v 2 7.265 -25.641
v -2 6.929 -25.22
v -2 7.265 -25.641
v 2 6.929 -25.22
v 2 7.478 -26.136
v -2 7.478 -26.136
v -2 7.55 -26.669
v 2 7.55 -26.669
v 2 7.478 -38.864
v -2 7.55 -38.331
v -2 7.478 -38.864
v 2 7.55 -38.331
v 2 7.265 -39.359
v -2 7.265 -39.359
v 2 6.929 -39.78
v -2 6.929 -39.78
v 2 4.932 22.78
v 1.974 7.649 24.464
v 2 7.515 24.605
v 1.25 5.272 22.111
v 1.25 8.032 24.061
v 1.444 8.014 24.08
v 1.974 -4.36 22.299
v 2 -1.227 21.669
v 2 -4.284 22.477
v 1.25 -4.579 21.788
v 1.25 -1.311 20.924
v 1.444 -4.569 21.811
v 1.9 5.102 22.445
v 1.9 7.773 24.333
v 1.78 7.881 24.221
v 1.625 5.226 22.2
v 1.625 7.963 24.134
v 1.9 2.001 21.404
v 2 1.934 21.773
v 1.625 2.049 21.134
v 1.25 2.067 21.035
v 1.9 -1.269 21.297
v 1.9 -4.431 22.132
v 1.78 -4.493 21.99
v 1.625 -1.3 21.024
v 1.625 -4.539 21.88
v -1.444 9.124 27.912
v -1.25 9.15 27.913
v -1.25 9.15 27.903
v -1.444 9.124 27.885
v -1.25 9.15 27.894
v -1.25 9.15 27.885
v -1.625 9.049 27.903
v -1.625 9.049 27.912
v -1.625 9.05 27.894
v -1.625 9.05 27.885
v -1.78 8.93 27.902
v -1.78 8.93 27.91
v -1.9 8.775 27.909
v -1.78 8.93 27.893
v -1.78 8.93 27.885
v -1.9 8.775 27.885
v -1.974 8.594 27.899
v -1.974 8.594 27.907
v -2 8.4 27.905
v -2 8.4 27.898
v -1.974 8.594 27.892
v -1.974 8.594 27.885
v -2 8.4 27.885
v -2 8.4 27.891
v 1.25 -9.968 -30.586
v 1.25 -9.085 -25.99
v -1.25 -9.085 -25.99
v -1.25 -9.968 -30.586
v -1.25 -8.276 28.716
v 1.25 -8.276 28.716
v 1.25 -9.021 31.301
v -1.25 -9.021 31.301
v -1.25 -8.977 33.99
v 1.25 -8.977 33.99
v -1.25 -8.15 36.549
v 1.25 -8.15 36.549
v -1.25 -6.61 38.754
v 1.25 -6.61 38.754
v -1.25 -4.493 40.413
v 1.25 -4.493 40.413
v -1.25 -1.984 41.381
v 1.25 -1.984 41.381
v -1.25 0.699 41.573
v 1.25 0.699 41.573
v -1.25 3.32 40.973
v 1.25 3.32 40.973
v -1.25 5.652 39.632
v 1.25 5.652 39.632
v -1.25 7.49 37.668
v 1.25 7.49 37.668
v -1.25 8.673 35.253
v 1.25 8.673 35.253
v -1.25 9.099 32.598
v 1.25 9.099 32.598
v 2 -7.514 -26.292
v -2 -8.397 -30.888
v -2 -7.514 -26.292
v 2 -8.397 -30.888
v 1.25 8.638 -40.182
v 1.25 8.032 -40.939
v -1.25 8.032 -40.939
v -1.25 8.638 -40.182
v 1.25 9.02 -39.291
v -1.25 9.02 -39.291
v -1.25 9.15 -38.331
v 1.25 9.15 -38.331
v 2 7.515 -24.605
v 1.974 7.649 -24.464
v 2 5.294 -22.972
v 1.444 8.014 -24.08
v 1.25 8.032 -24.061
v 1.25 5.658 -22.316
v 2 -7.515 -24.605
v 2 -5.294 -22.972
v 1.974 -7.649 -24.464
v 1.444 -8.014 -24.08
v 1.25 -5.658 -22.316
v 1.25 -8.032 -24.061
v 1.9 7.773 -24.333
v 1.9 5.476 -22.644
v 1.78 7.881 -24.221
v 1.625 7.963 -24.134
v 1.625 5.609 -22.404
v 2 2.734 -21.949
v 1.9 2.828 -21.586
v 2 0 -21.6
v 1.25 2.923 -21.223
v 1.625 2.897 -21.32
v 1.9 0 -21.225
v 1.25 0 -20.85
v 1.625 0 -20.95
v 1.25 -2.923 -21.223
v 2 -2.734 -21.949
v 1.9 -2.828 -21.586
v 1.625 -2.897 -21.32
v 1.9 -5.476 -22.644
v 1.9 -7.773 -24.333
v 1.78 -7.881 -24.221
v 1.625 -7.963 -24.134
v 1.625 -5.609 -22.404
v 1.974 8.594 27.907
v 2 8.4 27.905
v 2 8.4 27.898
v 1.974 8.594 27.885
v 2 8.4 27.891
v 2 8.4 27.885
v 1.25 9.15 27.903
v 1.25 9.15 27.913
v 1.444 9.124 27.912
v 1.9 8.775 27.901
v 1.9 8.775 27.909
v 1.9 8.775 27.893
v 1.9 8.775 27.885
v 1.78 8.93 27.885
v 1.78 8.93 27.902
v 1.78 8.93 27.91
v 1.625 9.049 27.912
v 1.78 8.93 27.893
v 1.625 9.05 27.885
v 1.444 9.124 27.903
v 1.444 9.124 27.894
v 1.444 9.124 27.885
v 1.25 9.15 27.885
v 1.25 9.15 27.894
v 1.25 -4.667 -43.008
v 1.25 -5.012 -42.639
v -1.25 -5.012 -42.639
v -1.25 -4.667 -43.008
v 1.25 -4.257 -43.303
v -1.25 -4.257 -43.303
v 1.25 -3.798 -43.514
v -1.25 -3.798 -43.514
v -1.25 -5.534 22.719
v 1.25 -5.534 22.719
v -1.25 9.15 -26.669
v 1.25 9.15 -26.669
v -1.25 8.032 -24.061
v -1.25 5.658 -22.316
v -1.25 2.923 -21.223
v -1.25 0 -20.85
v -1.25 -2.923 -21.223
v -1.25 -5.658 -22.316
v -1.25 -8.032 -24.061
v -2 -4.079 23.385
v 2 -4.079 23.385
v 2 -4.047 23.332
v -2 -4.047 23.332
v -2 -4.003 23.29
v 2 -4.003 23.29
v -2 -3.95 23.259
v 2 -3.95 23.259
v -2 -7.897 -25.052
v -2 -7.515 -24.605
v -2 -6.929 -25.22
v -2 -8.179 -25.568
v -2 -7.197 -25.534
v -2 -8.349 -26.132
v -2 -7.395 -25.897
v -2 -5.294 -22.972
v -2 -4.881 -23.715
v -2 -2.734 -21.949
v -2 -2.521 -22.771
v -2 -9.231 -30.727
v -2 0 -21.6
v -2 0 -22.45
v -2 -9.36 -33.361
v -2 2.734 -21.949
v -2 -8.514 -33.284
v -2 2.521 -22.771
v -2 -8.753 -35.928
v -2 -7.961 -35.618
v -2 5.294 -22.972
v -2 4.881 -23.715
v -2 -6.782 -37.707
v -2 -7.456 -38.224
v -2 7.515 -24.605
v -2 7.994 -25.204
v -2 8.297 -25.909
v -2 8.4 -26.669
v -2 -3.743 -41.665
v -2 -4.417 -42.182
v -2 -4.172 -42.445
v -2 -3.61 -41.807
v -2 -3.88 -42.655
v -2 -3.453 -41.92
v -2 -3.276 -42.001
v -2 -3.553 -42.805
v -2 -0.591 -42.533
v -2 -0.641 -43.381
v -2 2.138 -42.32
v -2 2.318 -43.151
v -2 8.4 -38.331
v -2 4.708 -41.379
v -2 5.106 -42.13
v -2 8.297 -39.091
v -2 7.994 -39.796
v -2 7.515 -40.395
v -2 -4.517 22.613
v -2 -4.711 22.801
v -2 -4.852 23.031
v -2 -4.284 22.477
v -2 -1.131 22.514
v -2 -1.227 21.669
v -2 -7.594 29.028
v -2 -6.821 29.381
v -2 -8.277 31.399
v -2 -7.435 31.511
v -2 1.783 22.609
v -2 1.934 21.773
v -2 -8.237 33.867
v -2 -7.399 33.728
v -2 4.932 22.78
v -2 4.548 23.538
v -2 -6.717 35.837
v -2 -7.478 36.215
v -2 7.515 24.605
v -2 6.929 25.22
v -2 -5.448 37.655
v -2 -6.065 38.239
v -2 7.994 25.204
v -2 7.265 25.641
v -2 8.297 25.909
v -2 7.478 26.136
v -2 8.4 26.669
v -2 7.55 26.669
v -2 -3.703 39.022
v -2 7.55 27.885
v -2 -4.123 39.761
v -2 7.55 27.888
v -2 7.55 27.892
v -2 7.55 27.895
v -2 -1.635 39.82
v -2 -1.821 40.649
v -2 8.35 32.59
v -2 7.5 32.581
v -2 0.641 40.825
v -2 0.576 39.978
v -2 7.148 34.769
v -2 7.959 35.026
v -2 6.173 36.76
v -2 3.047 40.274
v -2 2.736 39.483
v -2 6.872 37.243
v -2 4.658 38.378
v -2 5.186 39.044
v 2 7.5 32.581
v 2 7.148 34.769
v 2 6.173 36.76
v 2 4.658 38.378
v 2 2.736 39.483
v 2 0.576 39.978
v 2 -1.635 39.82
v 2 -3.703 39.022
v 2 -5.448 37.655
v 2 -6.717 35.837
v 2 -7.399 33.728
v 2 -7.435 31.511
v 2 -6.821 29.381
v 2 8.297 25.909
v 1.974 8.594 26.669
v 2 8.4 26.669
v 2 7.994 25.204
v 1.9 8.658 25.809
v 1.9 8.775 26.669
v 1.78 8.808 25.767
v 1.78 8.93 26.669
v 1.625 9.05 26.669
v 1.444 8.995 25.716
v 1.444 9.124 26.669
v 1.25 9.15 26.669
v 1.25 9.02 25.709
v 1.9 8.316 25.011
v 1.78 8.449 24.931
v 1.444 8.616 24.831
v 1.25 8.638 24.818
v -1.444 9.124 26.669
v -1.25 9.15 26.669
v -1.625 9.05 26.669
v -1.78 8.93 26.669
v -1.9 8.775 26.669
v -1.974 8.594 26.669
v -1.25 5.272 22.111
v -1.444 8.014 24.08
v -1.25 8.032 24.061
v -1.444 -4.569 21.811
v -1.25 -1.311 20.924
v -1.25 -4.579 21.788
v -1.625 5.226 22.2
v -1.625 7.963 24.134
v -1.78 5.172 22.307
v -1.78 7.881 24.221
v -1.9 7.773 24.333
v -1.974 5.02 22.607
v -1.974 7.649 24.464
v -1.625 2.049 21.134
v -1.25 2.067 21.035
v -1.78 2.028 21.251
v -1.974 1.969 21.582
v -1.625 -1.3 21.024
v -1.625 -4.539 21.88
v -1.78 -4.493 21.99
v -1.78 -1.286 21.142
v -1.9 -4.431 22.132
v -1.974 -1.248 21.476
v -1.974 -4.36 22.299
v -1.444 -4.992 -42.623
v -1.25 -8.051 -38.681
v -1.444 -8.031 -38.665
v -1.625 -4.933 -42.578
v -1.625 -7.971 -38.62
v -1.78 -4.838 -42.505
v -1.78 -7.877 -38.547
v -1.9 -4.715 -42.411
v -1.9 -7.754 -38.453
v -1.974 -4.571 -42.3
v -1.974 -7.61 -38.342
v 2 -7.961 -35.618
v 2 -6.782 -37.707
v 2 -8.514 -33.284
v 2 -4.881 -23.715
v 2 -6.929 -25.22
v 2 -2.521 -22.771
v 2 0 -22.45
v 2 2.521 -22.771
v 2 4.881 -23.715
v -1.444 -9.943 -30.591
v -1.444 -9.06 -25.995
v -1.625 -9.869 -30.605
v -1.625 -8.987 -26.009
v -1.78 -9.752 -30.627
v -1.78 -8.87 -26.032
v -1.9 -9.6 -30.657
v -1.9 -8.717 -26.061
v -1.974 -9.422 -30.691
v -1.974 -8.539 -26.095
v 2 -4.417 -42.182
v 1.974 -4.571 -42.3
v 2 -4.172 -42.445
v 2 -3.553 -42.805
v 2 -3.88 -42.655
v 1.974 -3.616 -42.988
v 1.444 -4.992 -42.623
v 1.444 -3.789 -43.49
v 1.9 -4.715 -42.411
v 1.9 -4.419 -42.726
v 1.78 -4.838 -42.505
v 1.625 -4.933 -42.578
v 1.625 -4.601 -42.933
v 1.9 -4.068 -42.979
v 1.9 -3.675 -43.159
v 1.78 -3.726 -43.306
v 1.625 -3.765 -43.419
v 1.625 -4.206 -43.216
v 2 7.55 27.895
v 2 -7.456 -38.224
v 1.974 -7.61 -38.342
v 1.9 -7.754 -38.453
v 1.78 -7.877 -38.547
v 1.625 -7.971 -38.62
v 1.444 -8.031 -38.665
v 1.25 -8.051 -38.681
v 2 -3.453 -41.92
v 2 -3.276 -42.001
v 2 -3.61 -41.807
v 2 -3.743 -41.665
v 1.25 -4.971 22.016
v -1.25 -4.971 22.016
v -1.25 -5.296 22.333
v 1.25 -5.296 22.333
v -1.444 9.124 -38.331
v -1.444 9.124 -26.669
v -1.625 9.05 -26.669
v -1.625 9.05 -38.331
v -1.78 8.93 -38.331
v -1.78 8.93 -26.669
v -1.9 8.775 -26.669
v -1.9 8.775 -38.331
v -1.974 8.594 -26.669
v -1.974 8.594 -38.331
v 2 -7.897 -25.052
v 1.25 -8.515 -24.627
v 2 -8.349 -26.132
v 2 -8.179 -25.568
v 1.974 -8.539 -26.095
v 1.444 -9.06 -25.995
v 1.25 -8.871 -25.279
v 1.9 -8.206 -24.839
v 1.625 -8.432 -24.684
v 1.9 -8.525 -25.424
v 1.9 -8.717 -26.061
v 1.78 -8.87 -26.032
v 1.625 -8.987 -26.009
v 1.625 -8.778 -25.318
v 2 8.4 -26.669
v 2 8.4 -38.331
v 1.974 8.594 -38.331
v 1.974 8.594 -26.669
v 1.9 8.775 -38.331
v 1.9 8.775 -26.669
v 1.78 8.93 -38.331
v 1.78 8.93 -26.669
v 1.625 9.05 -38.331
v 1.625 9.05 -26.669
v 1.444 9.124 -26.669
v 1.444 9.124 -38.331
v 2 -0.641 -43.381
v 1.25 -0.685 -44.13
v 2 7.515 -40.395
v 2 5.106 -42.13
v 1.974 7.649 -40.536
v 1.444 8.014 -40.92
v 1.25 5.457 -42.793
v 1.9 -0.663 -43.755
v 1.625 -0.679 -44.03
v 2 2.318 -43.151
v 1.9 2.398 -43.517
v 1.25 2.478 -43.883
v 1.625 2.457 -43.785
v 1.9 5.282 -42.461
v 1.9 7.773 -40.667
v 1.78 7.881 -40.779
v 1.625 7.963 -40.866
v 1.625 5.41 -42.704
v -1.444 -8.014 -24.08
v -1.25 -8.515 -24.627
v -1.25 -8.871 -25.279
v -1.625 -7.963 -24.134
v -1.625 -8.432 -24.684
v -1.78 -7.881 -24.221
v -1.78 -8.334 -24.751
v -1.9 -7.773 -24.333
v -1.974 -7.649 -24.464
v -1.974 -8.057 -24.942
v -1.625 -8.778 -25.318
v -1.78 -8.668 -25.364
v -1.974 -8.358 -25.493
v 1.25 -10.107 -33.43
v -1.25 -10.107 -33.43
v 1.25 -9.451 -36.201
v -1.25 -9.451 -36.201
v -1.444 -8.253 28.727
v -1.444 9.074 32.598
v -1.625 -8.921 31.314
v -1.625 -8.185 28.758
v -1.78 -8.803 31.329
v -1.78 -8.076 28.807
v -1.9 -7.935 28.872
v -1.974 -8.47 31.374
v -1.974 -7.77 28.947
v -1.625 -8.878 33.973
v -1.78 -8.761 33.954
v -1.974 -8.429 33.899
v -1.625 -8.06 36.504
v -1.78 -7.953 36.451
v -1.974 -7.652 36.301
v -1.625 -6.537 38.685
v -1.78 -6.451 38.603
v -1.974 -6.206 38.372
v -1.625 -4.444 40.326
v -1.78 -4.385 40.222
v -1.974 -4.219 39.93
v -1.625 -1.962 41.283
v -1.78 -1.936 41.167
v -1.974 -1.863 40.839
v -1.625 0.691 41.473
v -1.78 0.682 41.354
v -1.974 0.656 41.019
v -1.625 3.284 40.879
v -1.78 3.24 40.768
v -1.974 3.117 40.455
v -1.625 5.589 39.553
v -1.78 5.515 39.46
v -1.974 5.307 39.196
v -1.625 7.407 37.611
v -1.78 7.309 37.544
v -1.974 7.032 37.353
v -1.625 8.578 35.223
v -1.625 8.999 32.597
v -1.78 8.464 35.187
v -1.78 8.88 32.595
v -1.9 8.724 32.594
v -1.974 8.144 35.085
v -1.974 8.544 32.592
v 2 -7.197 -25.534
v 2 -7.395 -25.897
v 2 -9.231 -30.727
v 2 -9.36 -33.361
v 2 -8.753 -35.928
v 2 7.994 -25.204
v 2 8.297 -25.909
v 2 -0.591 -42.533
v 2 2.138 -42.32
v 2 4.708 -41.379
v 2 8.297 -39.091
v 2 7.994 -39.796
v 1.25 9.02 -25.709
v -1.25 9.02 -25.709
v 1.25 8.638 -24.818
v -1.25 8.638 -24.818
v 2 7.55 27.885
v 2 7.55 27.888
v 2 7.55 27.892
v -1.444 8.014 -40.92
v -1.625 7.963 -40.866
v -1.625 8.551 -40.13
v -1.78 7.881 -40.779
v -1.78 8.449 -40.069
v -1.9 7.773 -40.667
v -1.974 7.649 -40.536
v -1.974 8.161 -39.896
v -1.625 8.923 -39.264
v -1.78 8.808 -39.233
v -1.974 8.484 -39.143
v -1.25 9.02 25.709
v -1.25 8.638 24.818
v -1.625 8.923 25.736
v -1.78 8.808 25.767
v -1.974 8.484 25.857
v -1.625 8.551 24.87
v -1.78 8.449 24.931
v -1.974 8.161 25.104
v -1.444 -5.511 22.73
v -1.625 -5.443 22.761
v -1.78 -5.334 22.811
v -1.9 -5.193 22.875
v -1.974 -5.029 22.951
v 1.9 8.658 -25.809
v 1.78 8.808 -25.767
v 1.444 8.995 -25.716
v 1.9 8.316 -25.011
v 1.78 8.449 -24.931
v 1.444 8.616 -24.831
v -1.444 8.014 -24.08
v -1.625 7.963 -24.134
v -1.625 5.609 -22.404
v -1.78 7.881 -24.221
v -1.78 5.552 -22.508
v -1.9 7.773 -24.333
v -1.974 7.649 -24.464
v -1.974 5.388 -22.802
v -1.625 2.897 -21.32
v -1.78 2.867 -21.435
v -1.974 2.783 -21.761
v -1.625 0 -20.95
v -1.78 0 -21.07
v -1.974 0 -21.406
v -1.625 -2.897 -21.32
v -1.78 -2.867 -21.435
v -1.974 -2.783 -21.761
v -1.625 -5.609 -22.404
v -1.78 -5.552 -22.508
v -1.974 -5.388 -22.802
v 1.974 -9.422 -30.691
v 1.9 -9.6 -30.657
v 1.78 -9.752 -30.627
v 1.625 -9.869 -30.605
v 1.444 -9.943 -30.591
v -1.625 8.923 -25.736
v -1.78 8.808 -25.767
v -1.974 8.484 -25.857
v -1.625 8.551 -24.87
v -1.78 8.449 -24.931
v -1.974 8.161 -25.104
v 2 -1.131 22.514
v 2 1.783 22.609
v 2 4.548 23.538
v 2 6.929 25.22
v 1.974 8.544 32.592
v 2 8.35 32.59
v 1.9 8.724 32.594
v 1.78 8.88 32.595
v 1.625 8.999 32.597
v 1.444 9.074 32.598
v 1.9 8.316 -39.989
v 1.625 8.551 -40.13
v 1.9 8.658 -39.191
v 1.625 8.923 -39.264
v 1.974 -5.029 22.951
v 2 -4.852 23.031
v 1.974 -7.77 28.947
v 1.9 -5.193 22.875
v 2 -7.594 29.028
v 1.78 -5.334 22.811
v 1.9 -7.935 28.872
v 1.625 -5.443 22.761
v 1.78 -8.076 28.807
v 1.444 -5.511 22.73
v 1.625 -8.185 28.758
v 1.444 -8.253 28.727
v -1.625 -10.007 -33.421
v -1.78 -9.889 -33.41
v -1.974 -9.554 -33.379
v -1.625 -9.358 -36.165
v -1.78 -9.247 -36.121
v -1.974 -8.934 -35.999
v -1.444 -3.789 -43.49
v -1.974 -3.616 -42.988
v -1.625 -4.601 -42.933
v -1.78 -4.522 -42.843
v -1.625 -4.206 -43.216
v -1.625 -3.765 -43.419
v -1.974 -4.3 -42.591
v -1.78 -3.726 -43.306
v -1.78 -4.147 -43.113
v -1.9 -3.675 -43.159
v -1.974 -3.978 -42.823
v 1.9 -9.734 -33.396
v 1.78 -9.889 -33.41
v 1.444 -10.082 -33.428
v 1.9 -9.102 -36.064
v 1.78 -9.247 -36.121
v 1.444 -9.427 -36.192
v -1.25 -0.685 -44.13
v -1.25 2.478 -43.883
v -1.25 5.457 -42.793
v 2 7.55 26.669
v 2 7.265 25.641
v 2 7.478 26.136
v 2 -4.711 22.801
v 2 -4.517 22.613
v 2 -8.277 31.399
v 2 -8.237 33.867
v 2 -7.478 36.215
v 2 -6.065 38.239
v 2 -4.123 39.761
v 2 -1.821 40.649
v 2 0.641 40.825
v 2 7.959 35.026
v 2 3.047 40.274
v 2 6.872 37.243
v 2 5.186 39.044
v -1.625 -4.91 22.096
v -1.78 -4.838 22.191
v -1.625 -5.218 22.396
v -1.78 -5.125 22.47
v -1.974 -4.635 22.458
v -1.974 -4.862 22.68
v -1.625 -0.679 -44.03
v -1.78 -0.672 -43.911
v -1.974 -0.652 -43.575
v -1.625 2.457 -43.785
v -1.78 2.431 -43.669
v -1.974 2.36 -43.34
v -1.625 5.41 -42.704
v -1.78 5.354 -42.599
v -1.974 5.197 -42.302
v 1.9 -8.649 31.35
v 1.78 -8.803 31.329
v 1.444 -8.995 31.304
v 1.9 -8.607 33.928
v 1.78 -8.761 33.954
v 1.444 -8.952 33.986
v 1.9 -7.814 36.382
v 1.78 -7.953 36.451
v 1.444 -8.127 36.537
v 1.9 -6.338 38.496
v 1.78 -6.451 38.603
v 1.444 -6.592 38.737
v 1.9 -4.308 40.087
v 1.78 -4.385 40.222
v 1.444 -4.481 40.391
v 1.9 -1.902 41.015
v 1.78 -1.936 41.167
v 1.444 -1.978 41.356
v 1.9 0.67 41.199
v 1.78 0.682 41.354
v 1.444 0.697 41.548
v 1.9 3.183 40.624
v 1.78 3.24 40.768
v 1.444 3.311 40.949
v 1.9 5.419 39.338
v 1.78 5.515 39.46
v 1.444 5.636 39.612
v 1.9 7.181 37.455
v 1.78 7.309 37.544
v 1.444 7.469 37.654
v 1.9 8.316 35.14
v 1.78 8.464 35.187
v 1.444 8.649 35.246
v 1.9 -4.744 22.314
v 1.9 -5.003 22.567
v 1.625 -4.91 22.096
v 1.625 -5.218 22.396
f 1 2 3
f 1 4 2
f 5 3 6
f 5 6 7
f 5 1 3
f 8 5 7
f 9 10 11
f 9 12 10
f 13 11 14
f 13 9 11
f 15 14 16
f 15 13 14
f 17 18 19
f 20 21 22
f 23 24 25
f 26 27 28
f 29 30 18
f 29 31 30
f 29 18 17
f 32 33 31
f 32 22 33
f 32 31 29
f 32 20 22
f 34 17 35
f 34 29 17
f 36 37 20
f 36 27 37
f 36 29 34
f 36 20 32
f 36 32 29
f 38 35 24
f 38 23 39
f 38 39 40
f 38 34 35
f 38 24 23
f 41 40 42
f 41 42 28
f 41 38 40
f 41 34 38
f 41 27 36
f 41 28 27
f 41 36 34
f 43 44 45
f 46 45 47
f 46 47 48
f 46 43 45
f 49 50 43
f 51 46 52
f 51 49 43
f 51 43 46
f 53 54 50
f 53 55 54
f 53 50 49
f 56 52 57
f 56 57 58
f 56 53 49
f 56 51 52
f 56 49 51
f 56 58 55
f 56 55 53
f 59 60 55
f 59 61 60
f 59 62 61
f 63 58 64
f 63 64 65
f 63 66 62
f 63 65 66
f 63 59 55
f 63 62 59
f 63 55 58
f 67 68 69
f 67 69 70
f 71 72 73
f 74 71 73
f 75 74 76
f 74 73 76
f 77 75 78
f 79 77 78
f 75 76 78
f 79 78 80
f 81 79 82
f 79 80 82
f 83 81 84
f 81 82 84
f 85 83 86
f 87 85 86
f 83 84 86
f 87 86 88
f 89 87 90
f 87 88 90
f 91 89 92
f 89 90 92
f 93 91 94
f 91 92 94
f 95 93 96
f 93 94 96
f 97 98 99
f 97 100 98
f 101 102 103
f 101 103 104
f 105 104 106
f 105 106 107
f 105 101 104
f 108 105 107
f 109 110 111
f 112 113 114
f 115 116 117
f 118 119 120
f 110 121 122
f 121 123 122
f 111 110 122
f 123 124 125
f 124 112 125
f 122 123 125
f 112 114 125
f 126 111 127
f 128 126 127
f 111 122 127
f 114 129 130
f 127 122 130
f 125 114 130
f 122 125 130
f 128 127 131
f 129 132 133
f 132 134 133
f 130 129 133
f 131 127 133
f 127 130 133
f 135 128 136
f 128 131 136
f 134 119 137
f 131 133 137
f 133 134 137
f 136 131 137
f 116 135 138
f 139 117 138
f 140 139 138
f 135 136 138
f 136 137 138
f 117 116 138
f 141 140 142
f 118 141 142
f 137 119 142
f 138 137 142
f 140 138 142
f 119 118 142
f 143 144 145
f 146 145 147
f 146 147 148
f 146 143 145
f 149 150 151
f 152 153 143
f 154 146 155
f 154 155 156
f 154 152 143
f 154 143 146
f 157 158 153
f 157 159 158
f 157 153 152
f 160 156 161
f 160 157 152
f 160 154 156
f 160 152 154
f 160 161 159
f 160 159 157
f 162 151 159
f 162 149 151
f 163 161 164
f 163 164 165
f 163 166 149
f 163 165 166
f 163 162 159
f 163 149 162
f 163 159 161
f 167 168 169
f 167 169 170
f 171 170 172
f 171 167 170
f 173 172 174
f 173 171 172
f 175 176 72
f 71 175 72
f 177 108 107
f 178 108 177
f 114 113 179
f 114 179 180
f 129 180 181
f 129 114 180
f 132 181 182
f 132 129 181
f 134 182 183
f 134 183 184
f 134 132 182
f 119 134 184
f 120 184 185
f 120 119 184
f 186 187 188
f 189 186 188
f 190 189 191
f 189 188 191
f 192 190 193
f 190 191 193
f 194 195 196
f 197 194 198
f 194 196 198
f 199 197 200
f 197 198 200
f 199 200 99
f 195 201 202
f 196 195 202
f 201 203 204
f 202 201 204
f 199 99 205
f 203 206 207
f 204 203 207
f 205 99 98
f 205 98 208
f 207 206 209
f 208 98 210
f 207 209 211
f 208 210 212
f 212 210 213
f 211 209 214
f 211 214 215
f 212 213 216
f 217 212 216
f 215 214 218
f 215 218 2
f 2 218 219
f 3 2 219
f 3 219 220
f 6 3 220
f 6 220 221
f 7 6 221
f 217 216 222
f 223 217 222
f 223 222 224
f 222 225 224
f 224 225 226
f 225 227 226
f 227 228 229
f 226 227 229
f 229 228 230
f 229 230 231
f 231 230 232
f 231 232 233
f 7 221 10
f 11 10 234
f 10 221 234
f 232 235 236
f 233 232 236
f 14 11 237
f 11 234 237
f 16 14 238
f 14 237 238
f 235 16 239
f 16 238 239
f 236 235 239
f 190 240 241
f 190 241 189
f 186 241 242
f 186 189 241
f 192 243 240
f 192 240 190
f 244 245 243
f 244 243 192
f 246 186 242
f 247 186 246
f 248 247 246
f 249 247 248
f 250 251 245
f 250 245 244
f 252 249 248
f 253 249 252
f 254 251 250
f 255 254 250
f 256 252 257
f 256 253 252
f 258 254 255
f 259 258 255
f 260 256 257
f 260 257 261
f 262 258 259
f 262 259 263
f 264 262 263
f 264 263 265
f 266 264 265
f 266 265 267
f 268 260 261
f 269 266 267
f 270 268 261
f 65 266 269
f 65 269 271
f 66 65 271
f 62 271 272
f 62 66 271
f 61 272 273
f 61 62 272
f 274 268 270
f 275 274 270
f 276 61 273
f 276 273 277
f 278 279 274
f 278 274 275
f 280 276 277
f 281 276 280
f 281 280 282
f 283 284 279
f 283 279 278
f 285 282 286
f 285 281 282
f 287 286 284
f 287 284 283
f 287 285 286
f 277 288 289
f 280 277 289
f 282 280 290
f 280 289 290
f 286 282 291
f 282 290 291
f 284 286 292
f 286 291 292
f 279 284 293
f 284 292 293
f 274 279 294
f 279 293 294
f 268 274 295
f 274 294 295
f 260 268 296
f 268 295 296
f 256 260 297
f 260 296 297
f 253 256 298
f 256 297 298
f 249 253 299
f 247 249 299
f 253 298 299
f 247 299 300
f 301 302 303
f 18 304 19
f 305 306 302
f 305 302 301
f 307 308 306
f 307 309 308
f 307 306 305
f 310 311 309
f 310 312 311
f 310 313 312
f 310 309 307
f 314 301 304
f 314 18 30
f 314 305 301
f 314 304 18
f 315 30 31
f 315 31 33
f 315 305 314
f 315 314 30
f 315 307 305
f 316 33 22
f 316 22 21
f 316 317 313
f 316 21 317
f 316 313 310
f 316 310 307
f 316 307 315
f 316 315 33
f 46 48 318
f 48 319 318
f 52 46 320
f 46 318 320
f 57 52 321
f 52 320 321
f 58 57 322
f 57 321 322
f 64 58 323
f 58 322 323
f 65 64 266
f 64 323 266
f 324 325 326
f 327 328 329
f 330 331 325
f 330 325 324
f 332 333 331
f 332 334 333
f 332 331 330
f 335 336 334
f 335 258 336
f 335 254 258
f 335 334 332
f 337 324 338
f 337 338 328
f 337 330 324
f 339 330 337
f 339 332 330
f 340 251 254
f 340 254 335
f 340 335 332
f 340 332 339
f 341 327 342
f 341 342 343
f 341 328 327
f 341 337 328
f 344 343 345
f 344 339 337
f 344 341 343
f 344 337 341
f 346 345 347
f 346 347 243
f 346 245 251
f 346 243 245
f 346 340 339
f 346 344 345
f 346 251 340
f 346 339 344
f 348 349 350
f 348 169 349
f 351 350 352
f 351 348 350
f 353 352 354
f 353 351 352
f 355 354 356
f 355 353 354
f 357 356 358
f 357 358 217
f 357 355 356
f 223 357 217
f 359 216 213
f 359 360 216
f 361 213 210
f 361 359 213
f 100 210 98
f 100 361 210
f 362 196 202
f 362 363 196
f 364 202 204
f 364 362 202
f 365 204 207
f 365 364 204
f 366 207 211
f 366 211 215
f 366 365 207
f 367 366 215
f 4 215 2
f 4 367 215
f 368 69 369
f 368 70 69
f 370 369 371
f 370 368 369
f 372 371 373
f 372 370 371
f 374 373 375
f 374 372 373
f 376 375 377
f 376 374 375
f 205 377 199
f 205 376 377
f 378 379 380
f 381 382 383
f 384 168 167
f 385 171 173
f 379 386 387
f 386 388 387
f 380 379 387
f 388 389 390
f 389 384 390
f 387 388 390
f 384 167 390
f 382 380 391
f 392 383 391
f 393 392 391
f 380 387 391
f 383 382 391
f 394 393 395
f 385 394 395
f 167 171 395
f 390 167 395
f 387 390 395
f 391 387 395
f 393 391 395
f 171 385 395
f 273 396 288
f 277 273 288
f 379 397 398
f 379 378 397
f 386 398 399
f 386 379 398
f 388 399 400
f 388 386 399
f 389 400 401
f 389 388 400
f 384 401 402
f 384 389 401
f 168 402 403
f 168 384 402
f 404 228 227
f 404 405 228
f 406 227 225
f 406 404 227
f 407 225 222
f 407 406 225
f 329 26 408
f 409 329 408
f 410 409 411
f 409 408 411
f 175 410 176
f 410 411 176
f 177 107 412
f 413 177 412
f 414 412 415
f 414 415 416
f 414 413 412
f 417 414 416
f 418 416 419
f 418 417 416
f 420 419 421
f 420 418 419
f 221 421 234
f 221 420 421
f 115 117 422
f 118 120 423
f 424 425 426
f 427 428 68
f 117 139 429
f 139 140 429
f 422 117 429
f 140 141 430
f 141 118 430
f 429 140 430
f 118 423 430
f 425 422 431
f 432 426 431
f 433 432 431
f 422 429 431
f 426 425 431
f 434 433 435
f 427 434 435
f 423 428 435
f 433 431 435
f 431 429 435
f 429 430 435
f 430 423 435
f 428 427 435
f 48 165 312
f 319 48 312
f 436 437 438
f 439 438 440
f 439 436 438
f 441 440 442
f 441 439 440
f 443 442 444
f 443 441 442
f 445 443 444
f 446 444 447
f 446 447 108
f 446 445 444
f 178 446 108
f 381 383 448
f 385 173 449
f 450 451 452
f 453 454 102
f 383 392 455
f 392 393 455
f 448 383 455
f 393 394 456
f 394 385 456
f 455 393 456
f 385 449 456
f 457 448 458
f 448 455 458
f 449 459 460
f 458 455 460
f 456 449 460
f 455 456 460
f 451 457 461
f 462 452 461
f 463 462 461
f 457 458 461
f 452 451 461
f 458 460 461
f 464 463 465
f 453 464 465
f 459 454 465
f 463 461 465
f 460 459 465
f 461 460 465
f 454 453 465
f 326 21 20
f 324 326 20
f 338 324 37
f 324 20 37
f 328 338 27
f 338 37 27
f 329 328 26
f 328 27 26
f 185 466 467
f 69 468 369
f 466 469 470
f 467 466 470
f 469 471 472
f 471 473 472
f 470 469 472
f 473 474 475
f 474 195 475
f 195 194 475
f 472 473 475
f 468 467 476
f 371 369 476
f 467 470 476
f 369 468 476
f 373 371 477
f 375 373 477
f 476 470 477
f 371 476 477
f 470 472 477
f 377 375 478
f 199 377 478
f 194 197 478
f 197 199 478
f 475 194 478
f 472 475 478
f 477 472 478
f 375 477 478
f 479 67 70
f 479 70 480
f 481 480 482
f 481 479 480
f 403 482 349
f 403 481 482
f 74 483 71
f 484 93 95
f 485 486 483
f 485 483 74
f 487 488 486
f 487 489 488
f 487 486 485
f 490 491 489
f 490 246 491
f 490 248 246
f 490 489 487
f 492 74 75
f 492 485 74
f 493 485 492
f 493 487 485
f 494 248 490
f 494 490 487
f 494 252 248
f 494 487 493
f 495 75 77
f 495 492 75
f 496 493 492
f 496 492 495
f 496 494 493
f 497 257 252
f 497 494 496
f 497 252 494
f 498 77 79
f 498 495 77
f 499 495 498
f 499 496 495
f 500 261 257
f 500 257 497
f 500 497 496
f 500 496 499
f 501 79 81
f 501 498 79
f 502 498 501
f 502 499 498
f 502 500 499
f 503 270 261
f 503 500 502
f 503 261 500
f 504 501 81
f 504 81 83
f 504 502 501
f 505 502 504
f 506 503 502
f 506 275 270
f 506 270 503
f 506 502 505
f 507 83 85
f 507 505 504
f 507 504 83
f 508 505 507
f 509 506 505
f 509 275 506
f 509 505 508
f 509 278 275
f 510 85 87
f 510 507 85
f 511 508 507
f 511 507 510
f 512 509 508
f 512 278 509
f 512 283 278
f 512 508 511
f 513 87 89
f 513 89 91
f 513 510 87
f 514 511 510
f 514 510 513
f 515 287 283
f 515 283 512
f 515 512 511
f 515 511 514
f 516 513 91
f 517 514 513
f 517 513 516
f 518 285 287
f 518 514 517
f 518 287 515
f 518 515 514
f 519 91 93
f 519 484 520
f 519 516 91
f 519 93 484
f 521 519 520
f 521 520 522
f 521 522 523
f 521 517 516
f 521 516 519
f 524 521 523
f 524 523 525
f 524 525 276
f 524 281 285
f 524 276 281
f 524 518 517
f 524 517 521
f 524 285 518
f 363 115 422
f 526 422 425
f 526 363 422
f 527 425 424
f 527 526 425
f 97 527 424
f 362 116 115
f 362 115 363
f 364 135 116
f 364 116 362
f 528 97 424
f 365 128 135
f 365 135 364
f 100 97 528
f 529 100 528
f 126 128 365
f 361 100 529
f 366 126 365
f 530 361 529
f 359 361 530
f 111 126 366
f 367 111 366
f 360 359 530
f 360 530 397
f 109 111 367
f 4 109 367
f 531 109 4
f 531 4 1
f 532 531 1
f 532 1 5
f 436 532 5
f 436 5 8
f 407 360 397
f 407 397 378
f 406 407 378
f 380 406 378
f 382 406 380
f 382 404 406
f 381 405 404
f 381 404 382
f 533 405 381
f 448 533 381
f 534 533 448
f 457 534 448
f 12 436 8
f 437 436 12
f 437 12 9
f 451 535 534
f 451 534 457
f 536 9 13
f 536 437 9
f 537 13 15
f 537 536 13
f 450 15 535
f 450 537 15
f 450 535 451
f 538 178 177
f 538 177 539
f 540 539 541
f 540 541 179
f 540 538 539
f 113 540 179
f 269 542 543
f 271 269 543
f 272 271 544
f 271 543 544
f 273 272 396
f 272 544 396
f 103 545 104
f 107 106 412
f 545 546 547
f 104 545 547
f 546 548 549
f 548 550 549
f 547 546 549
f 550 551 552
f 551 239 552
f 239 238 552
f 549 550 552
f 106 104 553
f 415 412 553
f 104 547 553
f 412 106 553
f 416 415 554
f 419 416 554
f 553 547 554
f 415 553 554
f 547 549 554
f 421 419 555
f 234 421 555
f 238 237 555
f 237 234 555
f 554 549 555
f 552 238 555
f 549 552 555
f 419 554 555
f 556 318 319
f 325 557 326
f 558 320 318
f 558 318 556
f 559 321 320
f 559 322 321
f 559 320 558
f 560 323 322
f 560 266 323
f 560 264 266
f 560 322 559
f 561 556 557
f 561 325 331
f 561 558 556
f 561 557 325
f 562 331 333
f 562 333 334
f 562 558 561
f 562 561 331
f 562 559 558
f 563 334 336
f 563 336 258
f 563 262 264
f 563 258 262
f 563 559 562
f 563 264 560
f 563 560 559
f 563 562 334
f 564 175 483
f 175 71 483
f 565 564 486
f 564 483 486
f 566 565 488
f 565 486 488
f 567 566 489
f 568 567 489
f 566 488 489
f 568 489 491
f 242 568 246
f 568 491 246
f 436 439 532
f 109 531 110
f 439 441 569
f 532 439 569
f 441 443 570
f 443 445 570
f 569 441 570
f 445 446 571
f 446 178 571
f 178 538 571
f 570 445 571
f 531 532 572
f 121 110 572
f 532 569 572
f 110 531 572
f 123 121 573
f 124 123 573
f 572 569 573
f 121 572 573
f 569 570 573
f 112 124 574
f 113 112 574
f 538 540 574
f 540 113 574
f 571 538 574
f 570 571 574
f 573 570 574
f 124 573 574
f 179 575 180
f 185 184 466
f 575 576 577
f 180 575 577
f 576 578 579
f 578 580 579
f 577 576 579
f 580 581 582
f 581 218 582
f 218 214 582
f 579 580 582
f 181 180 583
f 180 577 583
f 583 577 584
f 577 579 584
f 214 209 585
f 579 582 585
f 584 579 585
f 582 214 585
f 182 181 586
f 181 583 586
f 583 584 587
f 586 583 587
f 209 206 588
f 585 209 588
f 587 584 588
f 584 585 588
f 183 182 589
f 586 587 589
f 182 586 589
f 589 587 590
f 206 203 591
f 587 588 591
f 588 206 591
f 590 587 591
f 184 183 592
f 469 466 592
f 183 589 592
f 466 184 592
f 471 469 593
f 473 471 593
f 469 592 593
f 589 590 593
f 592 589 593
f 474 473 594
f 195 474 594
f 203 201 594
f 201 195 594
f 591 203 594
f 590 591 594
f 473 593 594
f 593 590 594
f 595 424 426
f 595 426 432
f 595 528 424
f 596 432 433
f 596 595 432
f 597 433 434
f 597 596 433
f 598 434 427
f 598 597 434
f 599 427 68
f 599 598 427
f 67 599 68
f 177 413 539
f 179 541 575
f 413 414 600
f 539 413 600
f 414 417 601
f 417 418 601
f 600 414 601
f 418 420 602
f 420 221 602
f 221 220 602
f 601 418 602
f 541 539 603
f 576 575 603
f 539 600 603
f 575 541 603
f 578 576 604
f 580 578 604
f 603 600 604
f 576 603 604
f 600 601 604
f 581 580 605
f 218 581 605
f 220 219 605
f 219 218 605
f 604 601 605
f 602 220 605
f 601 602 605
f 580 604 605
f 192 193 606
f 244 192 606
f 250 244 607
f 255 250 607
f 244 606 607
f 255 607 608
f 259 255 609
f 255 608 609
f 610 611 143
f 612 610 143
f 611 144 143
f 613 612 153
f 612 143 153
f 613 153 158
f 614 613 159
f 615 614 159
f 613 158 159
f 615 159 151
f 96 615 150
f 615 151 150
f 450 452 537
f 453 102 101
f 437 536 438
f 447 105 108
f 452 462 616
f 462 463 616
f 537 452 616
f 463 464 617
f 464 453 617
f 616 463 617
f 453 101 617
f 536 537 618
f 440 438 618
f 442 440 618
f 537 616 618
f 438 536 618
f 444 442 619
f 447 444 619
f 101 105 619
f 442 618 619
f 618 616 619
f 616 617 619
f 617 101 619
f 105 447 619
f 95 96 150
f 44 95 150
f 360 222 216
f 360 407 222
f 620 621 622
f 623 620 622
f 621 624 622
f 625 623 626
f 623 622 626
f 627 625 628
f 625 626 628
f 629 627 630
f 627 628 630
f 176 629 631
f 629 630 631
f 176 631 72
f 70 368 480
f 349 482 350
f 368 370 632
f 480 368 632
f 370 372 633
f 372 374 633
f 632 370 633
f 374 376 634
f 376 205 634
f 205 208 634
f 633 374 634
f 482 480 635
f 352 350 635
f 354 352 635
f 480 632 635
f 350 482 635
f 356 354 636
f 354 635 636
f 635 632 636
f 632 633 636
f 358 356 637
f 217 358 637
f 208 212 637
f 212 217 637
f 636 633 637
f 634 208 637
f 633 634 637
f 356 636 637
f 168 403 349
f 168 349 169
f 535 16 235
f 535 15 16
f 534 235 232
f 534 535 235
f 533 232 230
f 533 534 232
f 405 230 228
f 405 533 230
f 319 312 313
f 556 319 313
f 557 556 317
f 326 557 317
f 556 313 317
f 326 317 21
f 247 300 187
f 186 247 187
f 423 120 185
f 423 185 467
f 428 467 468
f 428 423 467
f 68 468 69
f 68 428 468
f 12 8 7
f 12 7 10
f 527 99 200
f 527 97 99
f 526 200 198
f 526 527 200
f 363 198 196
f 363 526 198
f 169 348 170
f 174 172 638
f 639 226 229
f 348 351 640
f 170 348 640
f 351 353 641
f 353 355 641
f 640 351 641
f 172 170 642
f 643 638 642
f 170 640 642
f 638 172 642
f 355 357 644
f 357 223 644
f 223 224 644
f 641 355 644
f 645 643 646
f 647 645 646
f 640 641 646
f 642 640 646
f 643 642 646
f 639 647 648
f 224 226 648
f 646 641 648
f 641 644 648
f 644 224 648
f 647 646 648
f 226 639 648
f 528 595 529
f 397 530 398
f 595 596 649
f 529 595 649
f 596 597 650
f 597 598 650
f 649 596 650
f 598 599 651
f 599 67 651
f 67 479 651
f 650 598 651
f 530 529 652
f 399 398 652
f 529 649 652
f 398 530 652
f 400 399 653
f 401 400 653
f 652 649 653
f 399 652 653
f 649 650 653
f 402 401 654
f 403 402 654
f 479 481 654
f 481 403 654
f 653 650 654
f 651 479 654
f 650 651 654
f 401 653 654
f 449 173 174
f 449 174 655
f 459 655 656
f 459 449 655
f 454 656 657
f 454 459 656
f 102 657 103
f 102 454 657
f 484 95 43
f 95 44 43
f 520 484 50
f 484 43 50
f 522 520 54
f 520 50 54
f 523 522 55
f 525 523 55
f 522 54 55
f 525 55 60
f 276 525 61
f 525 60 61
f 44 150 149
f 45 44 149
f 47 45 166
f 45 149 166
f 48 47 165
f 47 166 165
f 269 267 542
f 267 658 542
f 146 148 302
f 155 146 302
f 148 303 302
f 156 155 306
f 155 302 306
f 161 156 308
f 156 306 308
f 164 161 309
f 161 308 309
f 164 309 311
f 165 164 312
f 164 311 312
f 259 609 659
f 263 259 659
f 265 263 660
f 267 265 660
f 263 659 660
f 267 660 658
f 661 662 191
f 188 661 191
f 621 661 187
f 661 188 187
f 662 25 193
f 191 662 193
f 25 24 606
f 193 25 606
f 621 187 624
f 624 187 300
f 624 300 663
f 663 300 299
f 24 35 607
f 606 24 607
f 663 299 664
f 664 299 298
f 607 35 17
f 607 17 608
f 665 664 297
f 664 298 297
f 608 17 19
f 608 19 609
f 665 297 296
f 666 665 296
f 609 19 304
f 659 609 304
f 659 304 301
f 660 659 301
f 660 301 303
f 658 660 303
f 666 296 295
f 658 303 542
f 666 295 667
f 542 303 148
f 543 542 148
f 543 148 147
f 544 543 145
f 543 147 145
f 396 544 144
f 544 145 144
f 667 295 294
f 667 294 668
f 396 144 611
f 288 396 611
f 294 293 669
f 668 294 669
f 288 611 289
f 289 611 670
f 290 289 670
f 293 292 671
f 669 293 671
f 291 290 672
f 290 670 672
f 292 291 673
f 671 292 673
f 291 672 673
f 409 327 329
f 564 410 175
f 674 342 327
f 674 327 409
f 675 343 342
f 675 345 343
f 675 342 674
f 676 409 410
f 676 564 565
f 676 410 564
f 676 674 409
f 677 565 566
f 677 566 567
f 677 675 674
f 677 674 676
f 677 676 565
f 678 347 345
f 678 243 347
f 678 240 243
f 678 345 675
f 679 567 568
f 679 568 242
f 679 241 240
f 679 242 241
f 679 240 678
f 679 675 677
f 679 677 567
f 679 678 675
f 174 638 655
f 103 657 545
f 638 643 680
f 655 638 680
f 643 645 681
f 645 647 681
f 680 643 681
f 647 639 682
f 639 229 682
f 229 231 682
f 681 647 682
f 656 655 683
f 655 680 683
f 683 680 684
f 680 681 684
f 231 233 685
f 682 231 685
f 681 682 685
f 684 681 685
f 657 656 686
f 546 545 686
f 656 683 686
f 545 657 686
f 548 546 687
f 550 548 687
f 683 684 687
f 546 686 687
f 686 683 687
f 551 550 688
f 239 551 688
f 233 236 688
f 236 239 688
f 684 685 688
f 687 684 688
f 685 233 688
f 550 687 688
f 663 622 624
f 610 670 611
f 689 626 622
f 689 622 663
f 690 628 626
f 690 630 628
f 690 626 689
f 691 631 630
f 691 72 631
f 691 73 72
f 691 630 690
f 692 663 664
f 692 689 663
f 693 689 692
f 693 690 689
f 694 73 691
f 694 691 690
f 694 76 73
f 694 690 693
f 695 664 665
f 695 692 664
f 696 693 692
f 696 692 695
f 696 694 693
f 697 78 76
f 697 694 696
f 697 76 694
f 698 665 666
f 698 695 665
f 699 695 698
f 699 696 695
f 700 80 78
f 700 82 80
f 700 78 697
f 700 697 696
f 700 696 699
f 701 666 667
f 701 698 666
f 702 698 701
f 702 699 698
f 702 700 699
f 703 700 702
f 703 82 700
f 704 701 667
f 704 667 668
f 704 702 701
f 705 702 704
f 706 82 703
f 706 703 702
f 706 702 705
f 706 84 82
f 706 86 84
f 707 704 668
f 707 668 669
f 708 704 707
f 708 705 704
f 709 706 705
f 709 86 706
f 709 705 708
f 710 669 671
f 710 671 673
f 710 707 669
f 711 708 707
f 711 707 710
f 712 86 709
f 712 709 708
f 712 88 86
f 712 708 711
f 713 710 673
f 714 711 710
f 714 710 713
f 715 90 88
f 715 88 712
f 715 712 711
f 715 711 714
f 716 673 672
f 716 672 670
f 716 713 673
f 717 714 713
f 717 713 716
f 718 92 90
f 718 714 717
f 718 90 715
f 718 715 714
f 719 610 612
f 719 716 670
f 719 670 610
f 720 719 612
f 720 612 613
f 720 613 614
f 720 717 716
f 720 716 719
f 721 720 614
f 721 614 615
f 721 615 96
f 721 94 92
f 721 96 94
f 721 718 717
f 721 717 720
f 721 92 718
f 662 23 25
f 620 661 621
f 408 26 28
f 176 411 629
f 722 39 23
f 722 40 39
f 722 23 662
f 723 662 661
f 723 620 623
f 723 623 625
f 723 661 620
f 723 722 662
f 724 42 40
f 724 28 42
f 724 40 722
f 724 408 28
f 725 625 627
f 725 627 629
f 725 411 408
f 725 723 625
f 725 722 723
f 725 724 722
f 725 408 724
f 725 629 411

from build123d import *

# Parameters (mm, degrees)
BOSS_EXTRUDE1_DEPTH   = 2
BOSS_EXTRUDE1_2_DEPTH = 2
FILLET1_R             = 0.75
FILLET2_R             = 0.75


with BuildPart() as part:
    # Sketch2 → Boss-Extrude1 (new, symmetric)
    with BuildSketch(Plane(origin=(0, 0, 0), x_dir=(0, 0, -1), z_dir=(1, 0, 0))):
        with BuildLine():
            Line((38.680908936, -8.051016378), (42.638986873, -5.012329319))
            ThreePointArc((42.638986873, -5.012329319), (43.165658722, -4.469234537), (43.513690973, -3.797513812))
            ThreePointArc((43.513690973, -3.797513812), (43.883409513, 2.478000778), (40.938582556, 8.031987578))
            ThreePointArc((40.938582556, 8.031987578), (39.749550626, 8.858712384), (38.330951895, 9.15))
            Line((38.330951895, 9.15), (26.669048105, 9.15))
            ThreePointArc((26.669048105, 9.15), (25.250449374, 8.858712384), (24.061417444, 8.031987578))
            ThreePointArc((24.061417444, 8.031987578), (20.85, 0), (24.061417444, -8.031987578))
            ThreePointArc((24.061417444, -8.031987578), (24.943446907, -8.709477885), (25.990176628, -9.085411365))
            Line((25.990176628, -9.085411365), (30.585959585, -9.967895931))
            ThreePointArc((30.585959585, -9.967895931), (34.83883487, -9.876859392), (38.680908936, -8.051016378))
        make_face()
        with BuildLine():
            Line((26.669048105, 7.55), (38.330951895, 7.55))
            ThreePointArc((38.330951895, 7.55), (39.119062301, 7.388173547), (39.779635595, 6.928881988))
            ThreePointArc((39.779635595, 6.928881988), (42.320022799, 2.137674491), (42.001081054, -3.275966851))
            ThreePointArc((42.001081054, -3.275966851), (41.867222496, -3.534320976), (41.6646564, -3.743203584))
            Line((41.6646564, -3.743203584), (37.706578463, -6.781890644))
            ThreePointArc((37.706578463, -6.781890644), (34.470151541, -8.31991604), (30.887680242, -8.396601991))
            Line((30.887680242, -8.396601991), (26.291897285, -7.514117425))
            ThreePointArc((26.291897285, -7.514117425), (25.710380773, -7.305265492), (25.220364405, -6.928881988))
            ThreePointArc((25.220364405, -6.928881988), (22.45, 0), (25.220364405, 6.928881988))
            ThreePointArc((25.220364405, 6.928881988), (25.880937699, 7.388173547), (26.669048105, 7.55))
        make_face(mode=Mode.SUBTRACT)
    extrude(amount=BOSS_EXTRUDE1_DEPTH, both=True)

    # Fillet1
    fillet1_edges = [part.edges().sort_by_distance(p)[0] for p in [
        (2, -4.469234537, -43.165658722),
        (-2, 0, -20.85),
        (-2, 8.858712384, -25.250449374),
        (-2, 9.15, -32.5),
        (-2, 8.858712384, -39.749550626),
        (-2, 2.478000778, -43.883409513),
        (-2, -4.469234537, -43.165658722),
        (-2, -6.531672849, -40.659947904),
        (-2, -9.876859392, -34.83883487),
        (2, 2.478000778, -43.883409513),
        (2, 8.858712384, -39.749550626),
        (2, 9.15, -32.5),
        (2, 8.858712384, -25.250449374),
        (2, 0, -20.85),
        (2, -8.709477885, -24.943446907),
        (2, -9.526653648, -28.288068107),
        (2, -9.876859392, -34.83883487),
        (2, -6.531672849, -40.659947904),
        (-2, -9.526653648, -28.288068107),
        (-2, -8.709477885, -24.943446907),
    ]]
    fillet(fillet1_edges, radius=FILLET1_R)


with BuildPart() as body_2:
    # Sketch2 → Boss-Extrude1 2 (new, symmetric)
    with BuildSketch(Plane(origin=(0, 0, 0), x_dir=(0, 0, -1), z_dir=(1, 0, 0))):
        with BuildLine():
            Line((-32.597839378, 9.099474021), (-27.91268728, 9.14984972))
            ThreePointArc((-27.91268728, 9.14984972), (-27.898710428, 9.14996243), (-27.884733172, 9.15))
            Line((-27.884733172, 9.15), (-26.669048105, 9.15))
            ThreePointArc((-26.669048105, 9.15), (-25.250449374, 8.858712384), (-24.061417444, 8.031987578))
            ThreePointArc((-24.061417444, 8.031987578), (-21.034885432, 2.067280325), (-21.78755022, -4.578855721))
            ThreePointArc((-21.78755022, -4.578855721), (-22.164331782, -5.143496424), (-22.7194136, -5.534223493))
            Line((-22.7194136, -5.534223493), (-28.716095774, -8.275993524))
            ThreePointArc((-28.716095774, -8.275993524), (-41.381074632, -1.984064864), (-32.597839378, 9.099474021))
        make_face()
        with BuildLine():
            Line((-26.669048105, 7.55), (-27.884733172, 7.55))
            ThreePointArc((-27.884733172, 7.55), (-27.89010904, 7.54998555), (-27.895484752, 7.5499422))
            Line((-27.895484752, 7.5499422), (-32.58063685, 7.499566501))
            ThreePointArc((-32.58063685, 7.499566501), (-39.819567004, -1.635218294), (-29.381397616, -6.820873784))
            Line((-29.381397616, -6.820873784), (-23.384715442, -4.079103753))
            ThreePointArc((-23.384715442, -4.079103753), (-23.309704386, -4.026302798), (-23.258787958, -3.95))
            ThreePointArc((-23.258787958, -3.95), (-22.609493441, 1.783361997), (-25.220364405, 6.928881988))
            ThreePointArc((-25.220364405, 6.928881988), (-25.880937699, 7.388173547), (-26.669048105, 7.55))
        make_face(mode=Mode.SUBTRACT)
    extrude(amount=BOSS_EXTRUDE1_2_DEPTH, both=True)

    # Fillet2
    fillet2_edges = [body_2.edges().sort_by_distance(p)[0] for p in [
        (2, -5.143496424, 22.164331782),
        (-2, -6.905108509, 25.717754687),
        (-2, -1.984064864, 41.381074632),
        (2, 2.067280325, 21.034885432),
        (2, 8.858712384, 25.250449374),
        (2, 9.15, 27.276890639),
        (2, 9.14996243, 27.898710428),
        (2, 9.124661871, 30.255263329),
        (2, -1.984064864, 41.381074632),
        (2, -6.905108509, 25.717754687),
        (-2, 9.124661871, 30.255263329),
        (-2, 9.14996243, 27.898710428),
        (-2, 9.15, 27.276890639),
        (-2, 8.858712384, 25.250449374),
        (-2, 2.067280325, 21.034885432),
        (-2, -5.143496424, 22.164331782),
    ]]
    fillet(fillet2_edges, radius=FILLET2_R)


solid = Compound([part.part, body_2.part])
